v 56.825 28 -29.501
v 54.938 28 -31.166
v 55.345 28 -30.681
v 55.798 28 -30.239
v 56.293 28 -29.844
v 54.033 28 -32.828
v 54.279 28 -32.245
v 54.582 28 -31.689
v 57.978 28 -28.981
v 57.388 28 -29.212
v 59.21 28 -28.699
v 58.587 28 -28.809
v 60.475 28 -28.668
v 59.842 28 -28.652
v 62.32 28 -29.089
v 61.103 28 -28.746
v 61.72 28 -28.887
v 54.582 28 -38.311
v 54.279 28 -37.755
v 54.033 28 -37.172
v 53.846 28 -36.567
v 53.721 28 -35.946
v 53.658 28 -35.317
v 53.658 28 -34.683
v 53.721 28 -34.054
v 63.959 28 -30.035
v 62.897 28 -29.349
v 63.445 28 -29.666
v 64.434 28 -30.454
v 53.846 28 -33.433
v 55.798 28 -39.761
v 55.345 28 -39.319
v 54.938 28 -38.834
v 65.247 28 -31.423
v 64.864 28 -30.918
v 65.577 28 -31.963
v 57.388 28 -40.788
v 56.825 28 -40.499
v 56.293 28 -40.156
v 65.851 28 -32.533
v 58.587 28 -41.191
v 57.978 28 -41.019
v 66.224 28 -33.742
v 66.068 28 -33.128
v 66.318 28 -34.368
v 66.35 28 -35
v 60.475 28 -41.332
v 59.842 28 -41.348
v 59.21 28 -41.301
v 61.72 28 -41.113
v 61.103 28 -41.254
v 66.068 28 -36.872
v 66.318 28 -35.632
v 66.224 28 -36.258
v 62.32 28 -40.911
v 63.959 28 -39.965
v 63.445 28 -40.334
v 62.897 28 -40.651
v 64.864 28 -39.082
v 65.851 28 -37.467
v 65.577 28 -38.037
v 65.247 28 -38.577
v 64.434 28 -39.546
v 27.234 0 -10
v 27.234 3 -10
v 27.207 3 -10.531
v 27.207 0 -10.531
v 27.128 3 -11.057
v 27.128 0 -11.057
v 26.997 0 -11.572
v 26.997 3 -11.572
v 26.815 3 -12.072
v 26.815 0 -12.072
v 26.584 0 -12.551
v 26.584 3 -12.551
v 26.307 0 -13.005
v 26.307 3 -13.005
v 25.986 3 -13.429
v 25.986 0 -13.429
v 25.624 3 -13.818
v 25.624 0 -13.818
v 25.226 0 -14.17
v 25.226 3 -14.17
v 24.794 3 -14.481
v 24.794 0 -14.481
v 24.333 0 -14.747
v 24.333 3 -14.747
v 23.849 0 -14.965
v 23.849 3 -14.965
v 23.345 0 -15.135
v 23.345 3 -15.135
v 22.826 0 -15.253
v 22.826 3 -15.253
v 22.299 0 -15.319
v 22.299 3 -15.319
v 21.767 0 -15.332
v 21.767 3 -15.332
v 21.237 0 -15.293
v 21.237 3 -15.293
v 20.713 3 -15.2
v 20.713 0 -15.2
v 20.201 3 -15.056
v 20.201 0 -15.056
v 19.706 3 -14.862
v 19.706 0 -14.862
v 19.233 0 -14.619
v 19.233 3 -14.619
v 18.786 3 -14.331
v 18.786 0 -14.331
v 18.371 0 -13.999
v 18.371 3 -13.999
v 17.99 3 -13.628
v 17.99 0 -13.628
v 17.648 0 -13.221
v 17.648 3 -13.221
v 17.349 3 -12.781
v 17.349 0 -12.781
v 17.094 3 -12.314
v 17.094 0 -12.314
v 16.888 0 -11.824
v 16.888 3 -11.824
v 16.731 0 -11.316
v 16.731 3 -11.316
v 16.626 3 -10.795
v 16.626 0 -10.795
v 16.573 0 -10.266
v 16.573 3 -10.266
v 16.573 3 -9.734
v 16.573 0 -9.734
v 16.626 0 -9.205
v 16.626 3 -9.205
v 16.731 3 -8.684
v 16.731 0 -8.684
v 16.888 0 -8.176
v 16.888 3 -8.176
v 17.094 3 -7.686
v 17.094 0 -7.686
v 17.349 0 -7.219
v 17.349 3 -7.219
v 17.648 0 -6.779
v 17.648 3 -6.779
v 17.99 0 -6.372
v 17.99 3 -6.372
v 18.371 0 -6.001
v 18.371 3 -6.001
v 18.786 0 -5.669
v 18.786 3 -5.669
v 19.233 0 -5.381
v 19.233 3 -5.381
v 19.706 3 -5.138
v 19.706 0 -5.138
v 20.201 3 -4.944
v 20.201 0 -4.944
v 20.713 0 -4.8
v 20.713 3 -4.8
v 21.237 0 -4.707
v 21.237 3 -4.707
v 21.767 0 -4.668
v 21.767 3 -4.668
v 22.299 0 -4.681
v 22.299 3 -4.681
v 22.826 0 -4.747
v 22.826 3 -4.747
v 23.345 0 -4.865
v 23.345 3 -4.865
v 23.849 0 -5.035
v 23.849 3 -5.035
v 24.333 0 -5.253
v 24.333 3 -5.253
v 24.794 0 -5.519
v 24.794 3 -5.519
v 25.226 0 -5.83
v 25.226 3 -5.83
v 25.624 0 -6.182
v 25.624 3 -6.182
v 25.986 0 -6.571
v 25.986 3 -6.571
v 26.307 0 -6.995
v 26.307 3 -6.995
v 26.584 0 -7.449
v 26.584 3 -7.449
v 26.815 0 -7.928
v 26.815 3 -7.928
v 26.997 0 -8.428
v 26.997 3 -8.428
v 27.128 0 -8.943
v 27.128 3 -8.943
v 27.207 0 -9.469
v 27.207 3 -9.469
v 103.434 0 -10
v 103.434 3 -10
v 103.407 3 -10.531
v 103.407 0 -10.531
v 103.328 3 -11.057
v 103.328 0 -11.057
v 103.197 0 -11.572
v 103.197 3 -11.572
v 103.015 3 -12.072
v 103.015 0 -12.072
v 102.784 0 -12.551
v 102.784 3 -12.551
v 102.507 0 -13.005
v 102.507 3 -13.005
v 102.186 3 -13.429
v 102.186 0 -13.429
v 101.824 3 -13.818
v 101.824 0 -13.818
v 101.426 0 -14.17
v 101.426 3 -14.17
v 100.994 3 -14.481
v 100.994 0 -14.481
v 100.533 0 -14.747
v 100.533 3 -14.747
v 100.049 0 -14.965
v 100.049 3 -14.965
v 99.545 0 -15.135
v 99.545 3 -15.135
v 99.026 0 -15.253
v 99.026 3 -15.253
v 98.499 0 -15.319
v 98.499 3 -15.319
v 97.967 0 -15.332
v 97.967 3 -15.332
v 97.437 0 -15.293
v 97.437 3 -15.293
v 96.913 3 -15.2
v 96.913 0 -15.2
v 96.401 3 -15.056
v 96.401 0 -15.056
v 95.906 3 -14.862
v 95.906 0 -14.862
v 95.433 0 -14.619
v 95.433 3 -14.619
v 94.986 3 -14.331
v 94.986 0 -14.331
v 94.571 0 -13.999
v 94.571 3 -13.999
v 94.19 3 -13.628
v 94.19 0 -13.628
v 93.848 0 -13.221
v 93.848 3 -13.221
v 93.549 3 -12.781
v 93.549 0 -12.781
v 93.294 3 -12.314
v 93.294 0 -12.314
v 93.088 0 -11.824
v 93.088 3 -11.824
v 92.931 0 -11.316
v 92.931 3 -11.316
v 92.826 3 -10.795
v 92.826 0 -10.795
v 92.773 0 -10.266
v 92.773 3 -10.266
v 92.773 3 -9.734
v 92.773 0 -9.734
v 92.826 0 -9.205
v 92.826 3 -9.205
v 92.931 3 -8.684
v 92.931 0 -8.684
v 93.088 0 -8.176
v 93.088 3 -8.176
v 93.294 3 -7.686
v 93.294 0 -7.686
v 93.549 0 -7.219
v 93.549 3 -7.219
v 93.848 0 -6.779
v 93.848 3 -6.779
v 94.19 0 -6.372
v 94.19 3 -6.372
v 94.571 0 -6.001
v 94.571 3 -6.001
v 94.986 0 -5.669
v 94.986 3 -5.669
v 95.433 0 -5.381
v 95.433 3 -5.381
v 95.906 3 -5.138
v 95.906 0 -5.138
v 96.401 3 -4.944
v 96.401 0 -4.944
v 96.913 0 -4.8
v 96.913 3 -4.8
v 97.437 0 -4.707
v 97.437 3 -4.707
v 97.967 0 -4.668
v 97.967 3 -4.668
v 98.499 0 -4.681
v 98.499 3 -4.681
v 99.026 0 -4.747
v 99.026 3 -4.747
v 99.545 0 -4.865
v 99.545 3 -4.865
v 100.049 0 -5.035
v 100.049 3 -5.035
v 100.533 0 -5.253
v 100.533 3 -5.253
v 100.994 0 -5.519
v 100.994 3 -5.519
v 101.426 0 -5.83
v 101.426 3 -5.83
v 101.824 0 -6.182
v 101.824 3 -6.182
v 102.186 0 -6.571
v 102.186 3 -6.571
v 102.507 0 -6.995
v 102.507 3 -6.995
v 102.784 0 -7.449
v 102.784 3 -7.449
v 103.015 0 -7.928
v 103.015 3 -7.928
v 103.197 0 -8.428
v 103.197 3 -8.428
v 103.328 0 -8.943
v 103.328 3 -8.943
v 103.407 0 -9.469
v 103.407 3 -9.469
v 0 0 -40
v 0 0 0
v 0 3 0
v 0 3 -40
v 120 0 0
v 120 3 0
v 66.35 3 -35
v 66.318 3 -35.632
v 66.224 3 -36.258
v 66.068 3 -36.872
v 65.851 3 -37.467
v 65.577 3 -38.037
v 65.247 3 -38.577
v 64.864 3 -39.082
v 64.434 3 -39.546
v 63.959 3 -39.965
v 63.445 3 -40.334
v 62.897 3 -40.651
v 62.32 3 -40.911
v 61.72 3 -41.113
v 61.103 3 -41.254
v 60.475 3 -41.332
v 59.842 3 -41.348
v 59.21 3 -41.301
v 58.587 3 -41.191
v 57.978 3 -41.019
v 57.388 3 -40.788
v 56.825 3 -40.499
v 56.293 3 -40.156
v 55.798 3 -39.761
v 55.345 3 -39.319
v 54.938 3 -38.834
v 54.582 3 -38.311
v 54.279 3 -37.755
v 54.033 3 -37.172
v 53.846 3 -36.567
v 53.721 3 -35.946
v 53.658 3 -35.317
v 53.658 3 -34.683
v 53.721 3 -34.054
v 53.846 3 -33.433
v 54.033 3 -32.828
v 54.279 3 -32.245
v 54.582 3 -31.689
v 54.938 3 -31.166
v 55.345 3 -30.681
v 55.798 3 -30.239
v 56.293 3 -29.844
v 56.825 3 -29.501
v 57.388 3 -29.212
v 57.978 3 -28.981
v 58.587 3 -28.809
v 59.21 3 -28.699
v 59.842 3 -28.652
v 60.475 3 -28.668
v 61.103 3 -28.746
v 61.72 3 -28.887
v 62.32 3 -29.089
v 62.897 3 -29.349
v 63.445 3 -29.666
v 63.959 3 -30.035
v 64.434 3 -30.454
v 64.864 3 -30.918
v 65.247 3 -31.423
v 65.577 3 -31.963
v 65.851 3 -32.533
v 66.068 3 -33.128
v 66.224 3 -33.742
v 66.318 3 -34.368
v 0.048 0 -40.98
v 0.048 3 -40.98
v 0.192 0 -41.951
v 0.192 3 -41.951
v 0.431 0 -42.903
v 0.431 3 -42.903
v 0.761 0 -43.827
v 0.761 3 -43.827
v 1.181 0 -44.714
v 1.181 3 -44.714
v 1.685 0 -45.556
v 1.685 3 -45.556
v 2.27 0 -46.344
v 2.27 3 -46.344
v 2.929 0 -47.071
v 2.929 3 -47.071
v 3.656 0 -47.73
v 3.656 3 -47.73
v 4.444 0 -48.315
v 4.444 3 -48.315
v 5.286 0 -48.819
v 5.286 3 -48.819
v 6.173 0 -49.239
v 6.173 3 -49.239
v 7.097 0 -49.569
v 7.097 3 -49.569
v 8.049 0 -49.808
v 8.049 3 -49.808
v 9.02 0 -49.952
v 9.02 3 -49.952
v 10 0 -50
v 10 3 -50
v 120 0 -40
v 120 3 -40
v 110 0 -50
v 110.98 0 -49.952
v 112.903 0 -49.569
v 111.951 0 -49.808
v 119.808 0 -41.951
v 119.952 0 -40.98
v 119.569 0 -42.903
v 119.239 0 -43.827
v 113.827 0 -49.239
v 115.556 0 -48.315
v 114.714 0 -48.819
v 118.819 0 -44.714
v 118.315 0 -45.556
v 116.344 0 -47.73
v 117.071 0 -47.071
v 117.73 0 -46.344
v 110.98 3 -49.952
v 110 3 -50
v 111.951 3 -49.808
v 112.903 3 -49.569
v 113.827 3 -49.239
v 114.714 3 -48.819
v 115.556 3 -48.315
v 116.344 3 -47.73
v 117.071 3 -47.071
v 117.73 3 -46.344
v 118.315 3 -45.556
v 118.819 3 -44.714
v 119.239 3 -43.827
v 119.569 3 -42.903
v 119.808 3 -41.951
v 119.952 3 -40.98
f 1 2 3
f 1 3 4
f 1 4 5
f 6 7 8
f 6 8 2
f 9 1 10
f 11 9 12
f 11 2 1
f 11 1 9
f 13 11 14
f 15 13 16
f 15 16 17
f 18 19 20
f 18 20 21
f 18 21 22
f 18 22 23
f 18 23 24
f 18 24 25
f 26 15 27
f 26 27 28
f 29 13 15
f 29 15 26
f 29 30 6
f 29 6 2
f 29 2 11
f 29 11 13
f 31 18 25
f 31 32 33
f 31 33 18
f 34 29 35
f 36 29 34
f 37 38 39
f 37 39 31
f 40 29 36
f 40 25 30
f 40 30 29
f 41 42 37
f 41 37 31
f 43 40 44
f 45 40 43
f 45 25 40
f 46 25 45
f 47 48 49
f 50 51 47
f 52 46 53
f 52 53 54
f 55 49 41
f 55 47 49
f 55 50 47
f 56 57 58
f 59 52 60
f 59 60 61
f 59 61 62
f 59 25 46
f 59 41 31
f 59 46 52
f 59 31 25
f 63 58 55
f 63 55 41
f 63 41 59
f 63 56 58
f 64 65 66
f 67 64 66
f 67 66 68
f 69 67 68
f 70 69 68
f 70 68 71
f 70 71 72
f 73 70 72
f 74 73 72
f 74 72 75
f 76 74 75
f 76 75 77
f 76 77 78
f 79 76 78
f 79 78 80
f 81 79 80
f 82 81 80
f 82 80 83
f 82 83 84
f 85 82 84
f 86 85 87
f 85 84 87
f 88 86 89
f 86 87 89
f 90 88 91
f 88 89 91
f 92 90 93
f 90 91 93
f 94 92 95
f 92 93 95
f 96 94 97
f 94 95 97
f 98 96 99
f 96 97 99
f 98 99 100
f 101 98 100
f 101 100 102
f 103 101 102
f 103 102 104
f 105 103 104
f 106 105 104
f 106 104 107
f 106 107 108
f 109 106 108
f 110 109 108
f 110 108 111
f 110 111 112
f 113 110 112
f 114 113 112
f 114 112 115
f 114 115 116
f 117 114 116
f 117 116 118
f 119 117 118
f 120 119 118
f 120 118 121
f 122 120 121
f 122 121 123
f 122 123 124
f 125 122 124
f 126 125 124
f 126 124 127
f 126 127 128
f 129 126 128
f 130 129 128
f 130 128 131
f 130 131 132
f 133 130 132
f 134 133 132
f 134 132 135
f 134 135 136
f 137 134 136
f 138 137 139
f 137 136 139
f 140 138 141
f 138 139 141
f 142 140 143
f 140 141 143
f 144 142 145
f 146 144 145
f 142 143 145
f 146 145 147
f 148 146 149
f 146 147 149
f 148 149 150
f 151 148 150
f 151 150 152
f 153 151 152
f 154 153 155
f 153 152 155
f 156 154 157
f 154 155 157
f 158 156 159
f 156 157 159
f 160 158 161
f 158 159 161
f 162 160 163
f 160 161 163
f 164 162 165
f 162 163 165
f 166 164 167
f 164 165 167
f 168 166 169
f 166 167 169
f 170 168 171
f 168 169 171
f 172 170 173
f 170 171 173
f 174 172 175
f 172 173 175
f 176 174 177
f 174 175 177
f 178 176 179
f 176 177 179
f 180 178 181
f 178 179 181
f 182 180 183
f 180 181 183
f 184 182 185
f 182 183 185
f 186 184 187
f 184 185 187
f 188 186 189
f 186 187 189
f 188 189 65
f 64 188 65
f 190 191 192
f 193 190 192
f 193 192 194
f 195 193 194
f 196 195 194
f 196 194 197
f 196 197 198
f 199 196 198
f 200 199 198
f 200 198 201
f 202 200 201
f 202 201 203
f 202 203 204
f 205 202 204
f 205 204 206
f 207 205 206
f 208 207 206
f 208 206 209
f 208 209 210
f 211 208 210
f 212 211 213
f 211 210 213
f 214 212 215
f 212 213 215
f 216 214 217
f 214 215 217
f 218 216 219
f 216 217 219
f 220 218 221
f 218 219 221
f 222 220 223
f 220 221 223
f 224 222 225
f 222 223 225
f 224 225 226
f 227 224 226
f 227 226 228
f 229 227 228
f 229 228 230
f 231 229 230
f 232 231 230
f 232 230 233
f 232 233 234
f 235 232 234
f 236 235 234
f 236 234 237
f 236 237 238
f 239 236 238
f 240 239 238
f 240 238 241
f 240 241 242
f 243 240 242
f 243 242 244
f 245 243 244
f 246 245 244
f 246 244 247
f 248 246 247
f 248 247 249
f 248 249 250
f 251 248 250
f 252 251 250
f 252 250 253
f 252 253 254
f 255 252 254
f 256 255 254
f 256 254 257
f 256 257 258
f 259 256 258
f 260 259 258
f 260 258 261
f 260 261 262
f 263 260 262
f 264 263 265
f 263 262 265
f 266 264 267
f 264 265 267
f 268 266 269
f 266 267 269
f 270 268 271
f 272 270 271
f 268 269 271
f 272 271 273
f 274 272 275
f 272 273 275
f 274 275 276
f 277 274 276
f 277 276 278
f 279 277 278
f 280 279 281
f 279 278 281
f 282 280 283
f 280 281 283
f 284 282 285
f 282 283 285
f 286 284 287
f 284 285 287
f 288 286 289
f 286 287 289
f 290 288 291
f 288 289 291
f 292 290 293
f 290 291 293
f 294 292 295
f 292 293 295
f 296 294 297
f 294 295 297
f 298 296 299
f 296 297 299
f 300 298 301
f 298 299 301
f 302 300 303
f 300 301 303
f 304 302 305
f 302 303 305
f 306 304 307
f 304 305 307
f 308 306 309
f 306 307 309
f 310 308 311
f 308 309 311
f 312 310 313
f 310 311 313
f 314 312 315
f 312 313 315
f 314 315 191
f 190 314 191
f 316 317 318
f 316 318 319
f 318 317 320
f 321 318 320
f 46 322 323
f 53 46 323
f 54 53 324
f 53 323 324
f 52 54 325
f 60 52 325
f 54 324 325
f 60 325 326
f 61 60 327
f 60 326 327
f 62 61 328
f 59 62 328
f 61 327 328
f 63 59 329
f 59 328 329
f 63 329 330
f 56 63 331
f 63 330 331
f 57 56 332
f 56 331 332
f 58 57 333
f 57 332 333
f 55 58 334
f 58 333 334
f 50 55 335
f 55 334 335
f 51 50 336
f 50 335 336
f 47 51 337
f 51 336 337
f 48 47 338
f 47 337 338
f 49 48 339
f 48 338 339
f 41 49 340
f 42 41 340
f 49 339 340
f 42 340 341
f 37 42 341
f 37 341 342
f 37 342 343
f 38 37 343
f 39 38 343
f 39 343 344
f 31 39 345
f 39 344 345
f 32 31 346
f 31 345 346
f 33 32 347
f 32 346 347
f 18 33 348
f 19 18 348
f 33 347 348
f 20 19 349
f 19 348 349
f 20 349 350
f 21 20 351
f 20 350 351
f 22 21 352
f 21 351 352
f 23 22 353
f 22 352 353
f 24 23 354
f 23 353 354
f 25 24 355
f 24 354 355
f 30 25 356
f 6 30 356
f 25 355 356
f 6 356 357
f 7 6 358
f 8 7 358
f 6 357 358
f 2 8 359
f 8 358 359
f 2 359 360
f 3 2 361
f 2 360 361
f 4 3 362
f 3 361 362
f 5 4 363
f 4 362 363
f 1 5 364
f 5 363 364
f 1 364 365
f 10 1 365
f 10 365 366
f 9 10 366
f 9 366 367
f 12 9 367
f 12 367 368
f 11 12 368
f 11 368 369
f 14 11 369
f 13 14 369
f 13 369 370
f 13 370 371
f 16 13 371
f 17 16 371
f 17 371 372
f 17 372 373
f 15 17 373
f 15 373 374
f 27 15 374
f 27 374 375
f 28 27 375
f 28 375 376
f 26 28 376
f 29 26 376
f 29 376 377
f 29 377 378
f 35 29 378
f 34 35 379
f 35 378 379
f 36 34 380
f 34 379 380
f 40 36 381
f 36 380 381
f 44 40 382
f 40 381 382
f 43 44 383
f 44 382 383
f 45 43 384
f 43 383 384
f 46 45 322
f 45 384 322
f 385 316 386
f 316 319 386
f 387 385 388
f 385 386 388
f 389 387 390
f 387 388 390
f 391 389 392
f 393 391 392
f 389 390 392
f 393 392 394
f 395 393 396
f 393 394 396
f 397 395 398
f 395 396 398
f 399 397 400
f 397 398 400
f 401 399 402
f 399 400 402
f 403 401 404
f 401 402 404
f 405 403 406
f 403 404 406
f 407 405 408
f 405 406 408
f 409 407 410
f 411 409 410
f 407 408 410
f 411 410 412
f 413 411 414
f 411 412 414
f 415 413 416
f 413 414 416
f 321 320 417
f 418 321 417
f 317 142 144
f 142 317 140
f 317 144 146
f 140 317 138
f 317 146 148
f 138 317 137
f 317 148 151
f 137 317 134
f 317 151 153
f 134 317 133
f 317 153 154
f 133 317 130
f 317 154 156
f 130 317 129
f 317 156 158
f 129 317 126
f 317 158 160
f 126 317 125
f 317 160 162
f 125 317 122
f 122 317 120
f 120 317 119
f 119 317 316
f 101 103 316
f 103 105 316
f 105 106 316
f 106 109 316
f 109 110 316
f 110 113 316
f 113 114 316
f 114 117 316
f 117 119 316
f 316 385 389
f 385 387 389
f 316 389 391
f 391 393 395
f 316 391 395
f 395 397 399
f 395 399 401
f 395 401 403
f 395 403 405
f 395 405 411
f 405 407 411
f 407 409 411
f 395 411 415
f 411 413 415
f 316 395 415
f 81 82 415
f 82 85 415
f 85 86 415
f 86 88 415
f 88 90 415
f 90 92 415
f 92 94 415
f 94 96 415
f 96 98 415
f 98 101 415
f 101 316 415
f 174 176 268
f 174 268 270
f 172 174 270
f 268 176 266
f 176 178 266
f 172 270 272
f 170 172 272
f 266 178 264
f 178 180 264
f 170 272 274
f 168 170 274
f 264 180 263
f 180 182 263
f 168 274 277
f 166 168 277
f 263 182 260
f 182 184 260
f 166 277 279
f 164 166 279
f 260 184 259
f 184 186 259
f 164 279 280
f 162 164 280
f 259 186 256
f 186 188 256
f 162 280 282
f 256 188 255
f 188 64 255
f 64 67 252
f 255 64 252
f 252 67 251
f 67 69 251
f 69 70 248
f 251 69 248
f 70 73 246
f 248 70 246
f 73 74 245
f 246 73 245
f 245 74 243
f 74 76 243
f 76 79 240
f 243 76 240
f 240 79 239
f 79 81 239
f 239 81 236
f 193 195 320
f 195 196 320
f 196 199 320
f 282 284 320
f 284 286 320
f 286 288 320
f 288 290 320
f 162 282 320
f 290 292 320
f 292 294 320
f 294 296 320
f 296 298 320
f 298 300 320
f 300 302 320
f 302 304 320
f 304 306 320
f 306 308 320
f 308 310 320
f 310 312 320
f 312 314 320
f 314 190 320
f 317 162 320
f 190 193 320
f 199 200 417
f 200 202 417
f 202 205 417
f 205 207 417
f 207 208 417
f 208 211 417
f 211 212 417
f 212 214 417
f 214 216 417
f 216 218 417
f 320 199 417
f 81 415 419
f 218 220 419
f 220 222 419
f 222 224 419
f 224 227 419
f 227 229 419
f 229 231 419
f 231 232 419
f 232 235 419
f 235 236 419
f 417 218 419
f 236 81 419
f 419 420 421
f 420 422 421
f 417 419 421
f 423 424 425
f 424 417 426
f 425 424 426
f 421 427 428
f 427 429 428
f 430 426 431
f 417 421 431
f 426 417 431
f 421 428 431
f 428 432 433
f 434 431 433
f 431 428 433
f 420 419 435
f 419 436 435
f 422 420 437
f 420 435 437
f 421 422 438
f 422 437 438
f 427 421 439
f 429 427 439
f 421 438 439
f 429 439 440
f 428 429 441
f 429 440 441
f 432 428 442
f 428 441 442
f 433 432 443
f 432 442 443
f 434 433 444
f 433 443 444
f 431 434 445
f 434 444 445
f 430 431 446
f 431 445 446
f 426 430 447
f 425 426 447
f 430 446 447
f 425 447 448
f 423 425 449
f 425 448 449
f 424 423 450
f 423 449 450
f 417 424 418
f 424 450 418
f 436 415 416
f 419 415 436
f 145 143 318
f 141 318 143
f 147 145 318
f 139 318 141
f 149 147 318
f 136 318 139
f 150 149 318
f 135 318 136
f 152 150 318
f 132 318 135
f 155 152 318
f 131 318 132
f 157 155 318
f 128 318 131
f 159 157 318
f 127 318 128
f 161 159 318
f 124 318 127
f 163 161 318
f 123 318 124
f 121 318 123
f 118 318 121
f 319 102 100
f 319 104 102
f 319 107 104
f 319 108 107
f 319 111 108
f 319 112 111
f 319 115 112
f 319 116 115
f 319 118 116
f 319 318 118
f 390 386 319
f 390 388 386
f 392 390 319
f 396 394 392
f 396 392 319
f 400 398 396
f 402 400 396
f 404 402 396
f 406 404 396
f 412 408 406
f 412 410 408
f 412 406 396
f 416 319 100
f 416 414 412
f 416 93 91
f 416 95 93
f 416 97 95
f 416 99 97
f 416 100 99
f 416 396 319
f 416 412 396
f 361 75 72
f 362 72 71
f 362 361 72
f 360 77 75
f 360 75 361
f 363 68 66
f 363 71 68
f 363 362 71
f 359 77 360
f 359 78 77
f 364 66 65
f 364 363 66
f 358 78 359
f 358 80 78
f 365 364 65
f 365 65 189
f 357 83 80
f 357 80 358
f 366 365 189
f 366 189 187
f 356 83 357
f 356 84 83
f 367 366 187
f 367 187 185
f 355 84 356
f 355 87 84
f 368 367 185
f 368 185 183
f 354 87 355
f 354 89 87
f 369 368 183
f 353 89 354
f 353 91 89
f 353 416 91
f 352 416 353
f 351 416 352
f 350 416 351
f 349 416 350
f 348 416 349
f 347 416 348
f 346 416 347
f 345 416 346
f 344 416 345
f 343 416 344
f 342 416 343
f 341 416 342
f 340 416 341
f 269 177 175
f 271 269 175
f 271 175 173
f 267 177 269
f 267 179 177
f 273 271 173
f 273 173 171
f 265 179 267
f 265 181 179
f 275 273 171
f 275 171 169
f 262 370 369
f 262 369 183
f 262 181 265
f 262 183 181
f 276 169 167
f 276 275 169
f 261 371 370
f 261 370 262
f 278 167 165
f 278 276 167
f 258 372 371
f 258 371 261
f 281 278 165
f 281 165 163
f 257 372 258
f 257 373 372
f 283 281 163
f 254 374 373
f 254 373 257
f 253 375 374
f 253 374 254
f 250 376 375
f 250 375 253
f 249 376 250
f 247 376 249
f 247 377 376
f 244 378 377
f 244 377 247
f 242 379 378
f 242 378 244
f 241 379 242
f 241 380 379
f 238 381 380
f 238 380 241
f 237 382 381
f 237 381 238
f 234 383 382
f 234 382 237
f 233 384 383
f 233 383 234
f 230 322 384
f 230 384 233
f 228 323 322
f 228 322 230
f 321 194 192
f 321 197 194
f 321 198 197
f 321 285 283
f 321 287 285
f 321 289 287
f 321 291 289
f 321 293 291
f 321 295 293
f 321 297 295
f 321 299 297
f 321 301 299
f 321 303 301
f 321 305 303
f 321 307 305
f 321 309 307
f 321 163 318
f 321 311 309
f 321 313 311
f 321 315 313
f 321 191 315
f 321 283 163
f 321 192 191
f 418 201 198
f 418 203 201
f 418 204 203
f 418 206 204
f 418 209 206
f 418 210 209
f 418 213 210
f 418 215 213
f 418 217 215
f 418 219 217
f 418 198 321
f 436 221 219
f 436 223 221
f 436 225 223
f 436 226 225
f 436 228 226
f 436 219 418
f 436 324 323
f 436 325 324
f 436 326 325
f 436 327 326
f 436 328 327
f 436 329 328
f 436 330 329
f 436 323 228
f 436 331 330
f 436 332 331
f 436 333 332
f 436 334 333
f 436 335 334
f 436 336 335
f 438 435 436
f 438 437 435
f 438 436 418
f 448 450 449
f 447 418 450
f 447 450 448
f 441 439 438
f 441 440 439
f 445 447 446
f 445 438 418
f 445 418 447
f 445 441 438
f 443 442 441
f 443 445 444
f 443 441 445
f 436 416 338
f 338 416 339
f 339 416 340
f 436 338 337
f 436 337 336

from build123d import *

# Parameters (mm, degrees)
SKETCH1_W           = 120
SKETCH1_H           = 50
BOSS_EXTRUDE1_DEPTH = 3
SKETCH2_R           = 5.334
CUT_EXTRUDE1_DEPTH  = 4
SKETCH3_R           = 6.35
BOSS_EXTRUDE2_DEPTH = 25
FILLET1_R           = 10


with BuildPart() as part:
    # Sketch1 → Boss-Extrude1 (new body)
    with BuildSketch(Plane(origin=(0, 0, 0), x_dir=(1, 0, 0), z_dir=(0, 1, 0))):
        with Locations((60, 25)):
            Rectangle(SKETCH1_W, SKETCH1_H)
    extrude(amount=BOSS_EXTRUDE1_DEPTH)

    # Sketch2 → Cut-Extrude1 (cut, through all)
    with BuildSketch(Plane(origin=(0, 3, 0), x_dir=(1, 0, 0), z_dir=(0, 1, 0))):
        with Locations((21.9, 10)):
            Circle(SKETCH2_R)
        with Locations((98.1, 10)):
            Circle(SKETCH2_R)
    extrude(amount=-CUT_EXTRUDE1_DEPTH, mode=Mode.SUBTRACT)

    # Sketch3 → Boss-Extrude2 (add)
    with BuildSketch(Plane(origin=(0, 3, 0), x_dir=(1, 0, 0), z_dir=(0, 1, 0))):
        with Locations((60, 35)):
            Circle(SKETCH3_R)
    extrude(amount=BOSS_EXTRUDE2_DEPTH)

    # Fillet1
    fillet1_edges = [part.edges().sort_by_distance(p)[0] for p in [
        (0, 1.5, -50),
        (120, 1.5, -50),
    ]]
    fillet(fillet1_edges, radius=FILLET1_R)


solid = part.part
